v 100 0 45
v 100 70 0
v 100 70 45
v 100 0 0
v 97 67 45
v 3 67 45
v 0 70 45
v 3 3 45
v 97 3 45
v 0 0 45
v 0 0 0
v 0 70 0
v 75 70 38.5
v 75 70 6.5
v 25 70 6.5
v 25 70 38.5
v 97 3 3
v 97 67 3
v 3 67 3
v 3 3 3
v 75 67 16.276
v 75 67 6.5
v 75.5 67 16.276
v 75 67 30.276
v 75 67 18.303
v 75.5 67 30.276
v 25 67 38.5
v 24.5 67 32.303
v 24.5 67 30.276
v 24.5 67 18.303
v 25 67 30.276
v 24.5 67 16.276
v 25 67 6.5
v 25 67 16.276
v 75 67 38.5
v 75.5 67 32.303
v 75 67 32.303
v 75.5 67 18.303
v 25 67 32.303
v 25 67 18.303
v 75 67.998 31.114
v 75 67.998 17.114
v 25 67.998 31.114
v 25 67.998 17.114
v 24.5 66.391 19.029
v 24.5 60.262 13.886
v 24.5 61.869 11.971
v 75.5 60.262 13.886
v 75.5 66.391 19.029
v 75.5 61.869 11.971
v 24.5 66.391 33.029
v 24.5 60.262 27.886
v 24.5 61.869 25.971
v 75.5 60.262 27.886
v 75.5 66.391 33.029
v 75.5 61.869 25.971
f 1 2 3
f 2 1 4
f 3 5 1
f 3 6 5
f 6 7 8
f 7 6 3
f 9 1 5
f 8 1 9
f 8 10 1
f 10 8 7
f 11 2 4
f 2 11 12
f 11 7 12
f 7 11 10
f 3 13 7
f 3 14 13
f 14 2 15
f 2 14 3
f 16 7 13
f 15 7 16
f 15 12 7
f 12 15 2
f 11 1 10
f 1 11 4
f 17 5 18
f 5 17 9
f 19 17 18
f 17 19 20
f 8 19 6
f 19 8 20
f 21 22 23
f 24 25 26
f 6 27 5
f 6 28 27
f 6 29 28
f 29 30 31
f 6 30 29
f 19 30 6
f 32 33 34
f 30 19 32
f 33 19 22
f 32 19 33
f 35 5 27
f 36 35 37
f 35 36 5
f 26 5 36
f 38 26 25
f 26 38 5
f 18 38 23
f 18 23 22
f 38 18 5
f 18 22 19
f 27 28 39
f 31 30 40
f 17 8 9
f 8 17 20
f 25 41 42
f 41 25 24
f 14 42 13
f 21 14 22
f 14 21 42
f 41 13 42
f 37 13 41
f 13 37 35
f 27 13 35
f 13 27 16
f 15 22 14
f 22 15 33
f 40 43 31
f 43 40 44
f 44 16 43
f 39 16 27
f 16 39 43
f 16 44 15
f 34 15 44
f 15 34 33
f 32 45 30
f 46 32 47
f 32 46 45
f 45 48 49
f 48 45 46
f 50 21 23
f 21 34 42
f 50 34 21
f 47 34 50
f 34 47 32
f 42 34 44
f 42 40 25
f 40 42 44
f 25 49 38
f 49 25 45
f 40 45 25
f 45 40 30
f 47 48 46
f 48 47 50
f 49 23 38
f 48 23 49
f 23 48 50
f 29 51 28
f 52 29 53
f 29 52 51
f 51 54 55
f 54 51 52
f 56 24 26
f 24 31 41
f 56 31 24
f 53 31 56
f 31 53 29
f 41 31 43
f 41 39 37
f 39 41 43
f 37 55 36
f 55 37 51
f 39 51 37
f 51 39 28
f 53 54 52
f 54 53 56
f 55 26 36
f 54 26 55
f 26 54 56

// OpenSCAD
$fn = 32;

// ----------------------------------------------------------------------
// Vent box: louvers enclosure
// ----------------------------------------------------------------------

// --- parameters (mm) ---
box_l = 100;              // box length, X
box_w = 70;               // box width, Y
box_h = 45;               // box height, Z
wall_t = 3;               // shell wall thickness
win_l = 50;               // vent window width, X
win_h = 32;               // vent window height, Z
slat_t = 2.5;             // louver slat thickness
slat_d = 8;               // louver slat depth
slat_a = 40;              // louver slat angle, degrees
slat_pitch = 14;          // louver pitch
slat_yc = 64.13;          // slat centreline Y

win_z0 = (box_h - win_h) / 2;  // window lower edge Z
n_slats = 2;  // louver count
slat_z0 = win_z0 + (win_h - (n_slats - 1) * slat_pitch) / 2;

difference() {
  union() {
    difference() {
      cube([box_l, box_w, box_h]);
  translate([wall_t, wall_t, wall_t])
    cube([box_l - 2 * wall_t, box_w - 2 * wall_t, box_h]);
  translate([(box_l - win_l) / 2, box_w - wall_t - 1, win_z0])
    cube([win_l, wall_t + 2, win_h]);
    }
    for (i = [0 : n_slats - 1])
      translate([box_l / 2, slat_yc, slat_z0 + i * slat_pitch])
        rotate([slat_a, 0, 0])
          cube([win_l + 1, slat_d, slat_t], center = true);
  }
}
